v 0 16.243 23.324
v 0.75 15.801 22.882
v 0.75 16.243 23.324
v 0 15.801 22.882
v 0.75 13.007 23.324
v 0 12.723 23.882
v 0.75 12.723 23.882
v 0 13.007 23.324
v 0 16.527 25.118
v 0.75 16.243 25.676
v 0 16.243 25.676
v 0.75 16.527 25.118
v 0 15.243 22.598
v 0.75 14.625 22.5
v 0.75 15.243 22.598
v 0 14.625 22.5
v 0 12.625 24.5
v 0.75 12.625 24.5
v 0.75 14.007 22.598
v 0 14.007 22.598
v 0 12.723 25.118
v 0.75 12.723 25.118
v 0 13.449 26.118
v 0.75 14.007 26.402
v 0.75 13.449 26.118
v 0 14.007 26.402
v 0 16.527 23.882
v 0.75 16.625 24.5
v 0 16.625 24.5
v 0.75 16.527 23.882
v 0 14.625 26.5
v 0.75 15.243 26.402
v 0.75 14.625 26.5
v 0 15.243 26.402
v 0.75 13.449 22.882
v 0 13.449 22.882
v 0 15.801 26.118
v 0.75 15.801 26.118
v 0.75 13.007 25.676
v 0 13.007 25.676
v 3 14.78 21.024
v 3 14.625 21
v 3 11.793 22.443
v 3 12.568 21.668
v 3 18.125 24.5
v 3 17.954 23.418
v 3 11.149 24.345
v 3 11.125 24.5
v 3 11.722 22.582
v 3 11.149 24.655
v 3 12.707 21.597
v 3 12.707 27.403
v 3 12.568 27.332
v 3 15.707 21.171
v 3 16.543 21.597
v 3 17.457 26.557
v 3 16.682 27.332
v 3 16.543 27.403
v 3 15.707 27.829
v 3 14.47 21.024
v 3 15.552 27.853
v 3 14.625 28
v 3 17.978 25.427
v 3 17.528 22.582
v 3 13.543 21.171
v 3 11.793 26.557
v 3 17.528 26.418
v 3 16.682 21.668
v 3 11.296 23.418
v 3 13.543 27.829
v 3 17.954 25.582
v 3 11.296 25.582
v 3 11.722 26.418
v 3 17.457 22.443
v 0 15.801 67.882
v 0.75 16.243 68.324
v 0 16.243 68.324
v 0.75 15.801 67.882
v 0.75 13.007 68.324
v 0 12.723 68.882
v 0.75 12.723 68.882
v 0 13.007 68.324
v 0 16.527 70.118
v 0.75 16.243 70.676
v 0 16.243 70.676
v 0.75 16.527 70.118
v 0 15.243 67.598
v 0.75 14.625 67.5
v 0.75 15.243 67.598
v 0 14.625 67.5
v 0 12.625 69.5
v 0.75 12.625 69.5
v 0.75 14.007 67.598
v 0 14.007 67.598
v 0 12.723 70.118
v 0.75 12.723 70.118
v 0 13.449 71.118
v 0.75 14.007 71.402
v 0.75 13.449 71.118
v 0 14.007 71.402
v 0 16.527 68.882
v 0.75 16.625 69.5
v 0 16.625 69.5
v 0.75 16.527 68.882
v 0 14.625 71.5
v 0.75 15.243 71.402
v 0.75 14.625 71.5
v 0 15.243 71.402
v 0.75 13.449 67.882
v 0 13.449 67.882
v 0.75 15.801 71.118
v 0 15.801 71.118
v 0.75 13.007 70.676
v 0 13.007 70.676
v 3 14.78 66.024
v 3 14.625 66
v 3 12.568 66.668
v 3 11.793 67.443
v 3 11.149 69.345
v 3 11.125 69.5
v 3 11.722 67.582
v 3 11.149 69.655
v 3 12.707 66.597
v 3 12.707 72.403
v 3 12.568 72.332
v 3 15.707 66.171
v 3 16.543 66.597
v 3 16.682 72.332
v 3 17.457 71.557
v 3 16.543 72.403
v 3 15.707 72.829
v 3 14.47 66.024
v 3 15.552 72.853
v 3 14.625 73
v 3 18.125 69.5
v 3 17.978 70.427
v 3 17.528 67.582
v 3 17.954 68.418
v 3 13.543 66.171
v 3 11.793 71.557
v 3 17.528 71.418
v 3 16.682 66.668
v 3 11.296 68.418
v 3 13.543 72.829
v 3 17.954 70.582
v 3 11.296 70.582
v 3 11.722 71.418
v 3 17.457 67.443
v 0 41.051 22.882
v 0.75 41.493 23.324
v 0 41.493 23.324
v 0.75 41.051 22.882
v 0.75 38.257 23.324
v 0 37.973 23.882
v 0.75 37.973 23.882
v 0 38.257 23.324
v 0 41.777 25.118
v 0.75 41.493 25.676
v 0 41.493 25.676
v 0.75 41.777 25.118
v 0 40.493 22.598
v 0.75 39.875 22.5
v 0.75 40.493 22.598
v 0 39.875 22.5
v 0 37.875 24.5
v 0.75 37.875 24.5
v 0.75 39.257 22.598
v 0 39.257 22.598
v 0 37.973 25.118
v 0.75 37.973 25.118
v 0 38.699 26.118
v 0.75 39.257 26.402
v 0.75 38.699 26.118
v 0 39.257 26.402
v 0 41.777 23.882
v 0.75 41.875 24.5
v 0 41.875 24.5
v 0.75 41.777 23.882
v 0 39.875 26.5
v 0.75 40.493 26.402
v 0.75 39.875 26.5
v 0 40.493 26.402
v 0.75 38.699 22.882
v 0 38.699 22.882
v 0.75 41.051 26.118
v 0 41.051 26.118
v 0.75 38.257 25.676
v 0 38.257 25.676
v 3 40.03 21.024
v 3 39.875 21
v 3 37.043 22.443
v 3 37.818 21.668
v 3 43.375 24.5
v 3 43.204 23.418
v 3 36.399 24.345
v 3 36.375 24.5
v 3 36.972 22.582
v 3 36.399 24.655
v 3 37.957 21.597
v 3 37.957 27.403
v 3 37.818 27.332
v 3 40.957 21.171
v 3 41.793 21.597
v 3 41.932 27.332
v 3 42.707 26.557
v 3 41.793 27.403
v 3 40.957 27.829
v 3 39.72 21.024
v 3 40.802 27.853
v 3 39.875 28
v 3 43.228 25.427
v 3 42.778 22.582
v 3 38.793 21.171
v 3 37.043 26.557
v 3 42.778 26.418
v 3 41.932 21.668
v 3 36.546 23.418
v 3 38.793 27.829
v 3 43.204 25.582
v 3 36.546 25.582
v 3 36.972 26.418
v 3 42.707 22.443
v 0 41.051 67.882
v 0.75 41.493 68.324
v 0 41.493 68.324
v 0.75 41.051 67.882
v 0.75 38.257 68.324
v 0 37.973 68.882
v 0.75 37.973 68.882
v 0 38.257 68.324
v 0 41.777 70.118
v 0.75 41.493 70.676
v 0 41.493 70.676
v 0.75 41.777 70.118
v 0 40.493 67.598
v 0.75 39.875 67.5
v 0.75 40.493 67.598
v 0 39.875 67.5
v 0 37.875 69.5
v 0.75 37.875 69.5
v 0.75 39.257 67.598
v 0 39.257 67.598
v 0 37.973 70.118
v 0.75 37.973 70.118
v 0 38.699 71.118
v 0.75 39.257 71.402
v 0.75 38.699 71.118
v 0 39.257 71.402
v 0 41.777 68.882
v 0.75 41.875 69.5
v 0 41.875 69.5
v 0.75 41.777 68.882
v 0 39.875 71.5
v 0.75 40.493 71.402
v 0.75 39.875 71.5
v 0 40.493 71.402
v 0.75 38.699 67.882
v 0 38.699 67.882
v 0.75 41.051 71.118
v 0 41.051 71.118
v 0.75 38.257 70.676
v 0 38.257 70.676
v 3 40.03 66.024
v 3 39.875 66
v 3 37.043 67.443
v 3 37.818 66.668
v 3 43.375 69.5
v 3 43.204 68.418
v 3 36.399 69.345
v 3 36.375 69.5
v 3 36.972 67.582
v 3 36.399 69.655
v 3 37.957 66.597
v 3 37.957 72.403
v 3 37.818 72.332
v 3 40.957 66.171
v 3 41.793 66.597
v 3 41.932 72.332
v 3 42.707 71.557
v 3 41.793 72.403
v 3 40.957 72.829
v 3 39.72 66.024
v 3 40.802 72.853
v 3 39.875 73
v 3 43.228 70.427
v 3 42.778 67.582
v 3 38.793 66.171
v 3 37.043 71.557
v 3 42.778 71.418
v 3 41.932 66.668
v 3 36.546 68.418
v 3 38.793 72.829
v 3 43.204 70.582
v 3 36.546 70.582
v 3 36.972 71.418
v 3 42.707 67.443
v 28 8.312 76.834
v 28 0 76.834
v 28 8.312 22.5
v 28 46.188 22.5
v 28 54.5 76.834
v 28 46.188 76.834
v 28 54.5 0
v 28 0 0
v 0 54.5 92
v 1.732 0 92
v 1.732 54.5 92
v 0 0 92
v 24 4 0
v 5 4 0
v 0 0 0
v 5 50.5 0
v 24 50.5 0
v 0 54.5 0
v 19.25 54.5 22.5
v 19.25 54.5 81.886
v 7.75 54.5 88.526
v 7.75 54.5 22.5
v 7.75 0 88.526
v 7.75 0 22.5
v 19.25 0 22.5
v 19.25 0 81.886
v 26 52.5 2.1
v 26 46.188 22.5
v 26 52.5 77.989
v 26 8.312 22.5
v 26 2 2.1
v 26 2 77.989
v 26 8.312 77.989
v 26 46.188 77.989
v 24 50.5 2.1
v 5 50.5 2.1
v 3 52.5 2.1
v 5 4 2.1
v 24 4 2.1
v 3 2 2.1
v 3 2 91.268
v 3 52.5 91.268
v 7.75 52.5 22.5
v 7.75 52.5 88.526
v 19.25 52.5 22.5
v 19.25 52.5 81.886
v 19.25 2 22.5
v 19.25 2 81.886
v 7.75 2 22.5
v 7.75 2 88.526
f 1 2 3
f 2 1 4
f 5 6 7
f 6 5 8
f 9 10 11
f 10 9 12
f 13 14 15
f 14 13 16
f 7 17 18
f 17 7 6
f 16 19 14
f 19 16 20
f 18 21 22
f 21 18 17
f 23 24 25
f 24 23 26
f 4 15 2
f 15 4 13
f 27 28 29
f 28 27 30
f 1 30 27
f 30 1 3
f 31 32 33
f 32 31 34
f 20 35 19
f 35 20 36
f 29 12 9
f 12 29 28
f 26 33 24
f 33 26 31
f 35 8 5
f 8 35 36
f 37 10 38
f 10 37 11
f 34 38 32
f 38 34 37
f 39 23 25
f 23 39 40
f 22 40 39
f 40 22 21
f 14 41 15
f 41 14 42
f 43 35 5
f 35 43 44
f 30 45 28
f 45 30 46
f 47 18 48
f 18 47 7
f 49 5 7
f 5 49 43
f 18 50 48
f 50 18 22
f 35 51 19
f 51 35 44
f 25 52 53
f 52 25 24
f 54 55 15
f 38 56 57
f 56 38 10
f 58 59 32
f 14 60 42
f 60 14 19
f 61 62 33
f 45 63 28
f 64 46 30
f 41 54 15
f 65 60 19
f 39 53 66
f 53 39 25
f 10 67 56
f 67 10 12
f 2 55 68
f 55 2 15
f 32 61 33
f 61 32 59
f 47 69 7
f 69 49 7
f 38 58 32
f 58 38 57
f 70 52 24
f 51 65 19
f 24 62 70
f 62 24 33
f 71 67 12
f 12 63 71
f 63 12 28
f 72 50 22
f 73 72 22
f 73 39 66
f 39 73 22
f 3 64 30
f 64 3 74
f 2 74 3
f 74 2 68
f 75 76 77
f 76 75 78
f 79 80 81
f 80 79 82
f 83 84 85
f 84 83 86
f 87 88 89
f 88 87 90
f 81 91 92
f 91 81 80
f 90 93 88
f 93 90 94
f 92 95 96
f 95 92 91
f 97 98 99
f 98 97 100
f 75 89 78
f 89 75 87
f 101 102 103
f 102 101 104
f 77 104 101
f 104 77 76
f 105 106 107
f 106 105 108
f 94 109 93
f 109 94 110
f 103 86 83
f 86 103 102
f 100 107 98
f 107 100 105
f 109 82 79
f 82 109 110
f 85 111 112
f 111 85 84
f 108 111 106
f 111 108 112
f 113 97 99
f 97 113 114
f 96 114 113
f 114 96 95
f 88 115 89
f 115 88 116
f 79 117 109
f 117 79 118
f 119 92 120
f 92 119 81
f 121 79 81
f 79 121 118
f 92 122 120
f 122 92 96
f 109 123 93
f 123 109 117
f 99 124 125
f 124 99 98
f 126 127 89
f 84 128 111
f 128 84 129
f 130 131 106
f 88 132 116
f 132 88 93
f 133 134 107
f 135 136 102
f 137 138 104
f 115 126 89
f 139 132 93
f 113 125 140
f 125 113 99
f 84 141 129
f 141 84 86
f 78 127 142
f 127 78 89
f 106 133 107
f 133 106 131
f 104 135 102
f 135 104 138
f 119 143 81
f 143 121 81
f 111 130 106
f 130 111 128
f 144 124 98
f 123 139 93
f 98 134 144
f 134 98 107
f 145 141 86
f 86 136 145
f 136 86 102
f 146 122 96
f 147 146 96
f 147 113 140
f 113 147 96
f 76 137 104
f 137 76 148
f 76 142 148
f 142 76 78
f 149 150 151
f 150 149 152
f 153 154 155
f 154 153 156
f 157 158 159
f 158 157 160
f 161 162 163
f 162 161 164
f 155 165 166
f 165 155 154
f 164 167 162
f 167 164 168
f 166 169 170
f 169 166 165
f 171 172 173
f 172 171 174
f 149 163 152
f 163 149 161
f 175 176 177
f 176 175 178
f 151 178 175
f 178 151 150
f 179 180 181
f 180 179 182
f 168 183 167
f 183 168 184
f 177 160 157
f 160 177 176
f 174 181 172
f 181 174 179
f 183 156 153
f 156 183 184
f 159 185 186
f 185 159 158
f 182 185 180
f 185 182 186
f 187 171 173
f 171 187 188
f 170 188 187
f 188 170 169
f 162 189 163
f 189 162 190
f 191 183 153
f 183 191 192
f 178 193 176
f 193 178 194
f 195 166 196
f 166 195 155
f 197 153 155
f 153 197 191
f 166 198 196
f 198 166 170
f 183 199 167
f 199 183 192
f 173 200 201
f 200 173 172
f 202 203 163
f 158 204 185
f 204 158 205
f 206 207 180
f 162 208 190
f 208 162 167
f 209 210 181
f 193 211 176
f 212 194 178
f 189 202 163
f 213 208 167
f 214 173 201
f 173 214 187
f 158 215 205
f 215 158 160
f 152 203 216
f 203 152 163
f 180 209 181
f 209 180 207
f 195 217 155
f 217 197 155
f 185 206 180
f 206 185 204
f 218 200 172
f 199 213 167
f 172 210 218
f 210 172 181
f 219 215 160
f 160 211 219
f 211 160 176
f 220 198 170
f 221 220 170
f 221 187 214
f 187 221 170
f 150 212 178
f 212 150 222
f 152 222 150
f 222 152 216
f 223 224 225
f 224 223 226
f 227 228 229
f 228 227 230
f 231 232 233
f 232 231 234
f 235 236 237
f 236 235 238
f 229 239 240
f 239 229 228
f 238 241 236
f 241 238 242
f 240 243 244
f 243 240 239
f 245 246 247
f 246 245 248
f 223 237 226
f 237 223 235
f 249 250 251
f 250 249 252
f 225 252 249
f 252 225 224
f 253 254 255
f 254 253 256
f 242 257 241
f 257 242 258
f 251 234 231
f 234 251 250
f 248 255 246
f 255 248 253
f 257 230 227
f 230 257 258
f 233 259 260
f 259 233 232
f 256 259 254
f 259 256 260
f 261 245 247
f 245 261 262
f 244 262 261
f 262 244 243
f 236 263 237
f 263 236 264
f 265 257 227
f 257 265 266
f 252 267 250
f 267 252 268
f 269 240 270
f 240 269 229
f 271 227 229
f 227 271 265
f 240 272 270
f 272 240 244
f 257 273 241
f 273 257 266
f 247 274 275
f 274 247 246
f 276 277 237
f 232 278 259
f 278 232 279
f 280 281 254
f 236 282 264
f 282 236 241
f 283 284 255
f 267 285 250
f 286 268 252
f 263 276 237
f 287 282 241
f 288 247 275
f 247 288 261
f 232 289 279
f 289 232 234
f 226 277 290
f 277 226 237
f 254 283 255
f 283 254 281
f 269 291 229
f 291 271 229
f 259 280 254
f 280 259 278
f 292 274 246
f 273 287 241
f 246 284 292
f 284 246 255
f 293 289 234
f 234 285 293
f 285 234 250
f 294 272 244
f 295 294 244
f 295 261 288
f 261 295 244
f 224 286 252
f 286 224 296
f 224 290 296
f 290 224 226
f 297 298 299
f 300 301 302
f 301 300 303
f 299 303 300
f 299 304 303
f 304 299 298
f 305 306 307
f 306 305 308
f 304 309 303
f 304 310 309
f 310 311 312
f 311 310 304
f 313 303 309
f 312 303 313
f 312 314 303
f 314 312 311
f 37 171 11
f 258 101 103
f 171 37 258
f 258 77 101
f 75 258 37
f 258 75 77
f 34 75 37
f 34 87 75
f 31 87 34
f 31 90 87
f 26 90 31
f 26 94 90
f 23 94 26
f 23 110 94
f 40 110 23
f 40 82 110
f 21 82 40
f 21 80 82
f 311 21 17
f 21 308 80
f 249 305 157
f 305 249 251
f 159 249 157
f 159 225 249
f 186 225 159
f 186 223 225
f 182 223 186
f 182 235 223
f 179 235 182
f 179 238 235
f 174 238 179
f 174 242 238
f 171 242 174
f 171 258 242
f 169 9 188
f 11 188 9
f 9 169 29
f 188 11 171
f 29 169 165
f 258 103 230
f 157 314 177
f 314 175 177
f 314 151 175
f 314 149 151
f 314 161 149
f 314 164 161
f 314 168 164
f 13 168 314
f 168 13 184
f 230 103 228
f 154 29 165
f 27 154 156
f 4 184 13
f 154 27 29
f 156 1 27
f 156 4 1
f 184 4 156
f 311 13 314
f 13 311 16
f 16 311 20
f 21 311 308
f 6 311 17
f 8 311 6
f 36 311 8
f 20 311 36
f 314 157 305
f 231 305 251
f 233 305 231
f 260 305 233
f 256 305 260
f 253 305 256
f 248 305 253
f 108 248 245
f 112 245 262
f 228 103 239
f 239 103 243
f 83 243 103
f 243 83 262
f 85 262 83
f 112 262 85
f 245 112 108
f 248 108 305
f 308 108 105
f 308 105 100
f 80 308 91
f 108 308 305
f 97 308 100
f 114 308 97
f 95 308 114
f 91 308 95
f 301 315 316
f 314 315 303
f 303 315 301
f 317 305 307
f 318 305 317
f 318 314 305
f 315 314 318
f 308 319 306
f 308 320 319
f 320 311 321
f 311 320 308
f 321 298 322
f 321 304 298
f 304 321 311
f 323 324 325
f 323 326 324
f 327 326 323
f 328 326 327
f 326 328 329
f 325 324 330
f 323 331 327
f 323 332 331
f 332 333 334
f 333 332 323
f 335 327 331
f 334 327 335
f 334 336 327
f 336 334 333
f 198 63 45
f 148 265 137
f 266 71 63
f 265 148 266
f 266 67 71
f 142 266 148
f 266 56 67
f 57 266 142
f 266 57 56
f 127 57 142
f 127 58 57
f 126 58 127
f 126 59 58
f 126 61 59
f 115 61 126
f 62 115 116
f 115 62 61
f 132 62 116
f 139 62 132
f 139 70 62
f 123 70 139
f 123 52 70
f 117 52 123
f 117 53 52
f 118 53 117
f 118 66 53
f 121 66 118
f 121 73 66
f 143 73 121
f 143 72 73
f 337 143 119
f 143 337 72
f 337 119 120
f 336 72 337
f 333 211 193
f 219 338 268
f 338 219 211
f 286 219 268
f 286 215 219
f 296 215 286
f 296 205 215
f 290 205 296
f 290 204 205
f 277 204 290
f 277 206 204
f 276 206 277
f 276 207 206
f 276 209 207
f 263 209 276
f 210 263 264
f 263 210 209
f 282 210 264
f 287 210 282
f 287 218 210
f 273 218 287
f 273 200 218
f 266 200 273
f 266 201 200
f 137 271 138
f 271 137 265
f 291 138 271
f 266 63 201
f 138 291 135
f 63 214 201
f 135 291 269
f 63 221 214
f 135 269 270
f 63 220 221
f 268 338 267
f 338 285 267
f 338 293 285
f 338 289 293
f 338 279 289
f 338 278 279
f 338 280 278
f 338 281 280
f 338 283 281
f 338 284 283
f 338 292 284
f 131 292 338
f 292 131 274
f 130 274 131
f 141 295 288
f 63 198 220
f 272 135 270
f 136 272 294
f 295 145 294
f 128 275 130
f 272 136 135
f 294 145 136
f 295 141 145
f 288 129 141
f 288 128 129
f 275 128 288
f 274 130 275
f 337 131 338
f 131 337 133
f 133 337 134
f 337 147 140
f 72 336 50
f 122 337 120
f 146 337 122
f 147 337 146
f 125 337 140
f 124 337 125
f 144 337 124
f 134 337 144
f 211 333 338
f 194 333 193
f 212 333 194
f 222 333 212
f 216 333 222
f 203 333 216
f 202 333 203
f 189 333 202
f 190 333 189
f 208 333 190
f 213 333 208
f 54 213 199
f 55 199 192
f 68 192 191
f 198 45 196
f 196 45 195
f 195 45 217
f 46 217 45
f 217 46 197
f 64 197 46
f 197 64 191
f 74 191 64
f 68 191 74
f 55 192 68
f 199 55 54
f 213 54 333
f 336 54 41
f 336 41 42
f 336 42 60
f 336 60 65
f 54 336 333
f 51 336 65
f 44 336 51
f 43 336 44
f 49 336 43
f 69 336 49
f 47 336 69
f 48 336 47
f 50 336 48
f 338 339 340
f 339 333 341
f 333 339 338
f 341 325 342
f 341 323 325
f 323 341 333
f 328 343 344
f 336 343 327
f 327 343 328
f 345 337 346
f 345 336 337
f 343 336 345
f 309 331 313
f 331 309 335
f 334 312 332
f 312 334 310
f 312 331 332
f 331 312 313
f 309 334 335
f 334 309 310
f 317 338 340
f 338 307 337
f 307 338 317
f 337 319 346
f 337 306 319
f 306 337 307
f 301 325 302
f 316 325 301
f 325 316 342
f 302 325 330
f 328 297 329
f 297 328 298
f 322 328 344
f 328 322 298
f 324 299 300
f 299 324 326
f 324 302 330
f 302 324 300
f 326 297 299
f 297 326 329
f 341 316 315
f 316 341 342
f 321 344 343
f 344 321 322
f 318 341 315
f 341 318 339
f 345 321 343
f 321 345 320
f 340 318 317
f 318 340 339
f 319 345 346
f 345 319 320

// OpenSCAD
// Width of back wall (so that screw will sit flush)
backWallWidth = 3;

// Width of the walls
wallWidth = 2;

// Length of the brick
length = 23;

// Width of the brick
width = 50.5;

// Height of the holder
height = 90;

// Bottom lip protrusion
bottomLip = 2;

// A little bit larger than the threads
screwDiameter = 4;

// Chamfer angle of the top
chamferAngle = 30;

$fn=20;

module mainBox() {
  difference() {
    // Body
    cube([length + backWallWidth + wallWidth, width + (wallWidth * 2), height + wallWidth]);

    // Main Cutout
    translate([backWallWidth, wallWidth, wallWidth + 0.1]) 
      cube([length, width, height]);
    
    // Bottom Lip Cutout
    translate([backWallWidth + bottomLip, wallWidth + bottomLip, -0.1])
      cube([length - (bottomLip * 2), width - (bottomLip * 2), height]);
    
    // Top Box Chamfer
    translate([0, -0.1, height + backWallWidth]) 
      rotate([0, chamferAngle, 0])
      cube([height * 2, width + (wallWidth * 2) + 0.2, length]);
    
    // Cutout front air vent
    cutoutWidth = (width / 4) * 3;
    translate([wallWidth + length - 0.1, wallWidth + (width - cutoutWidth) / 2, height / 4])
      cube([length, cutoutWidth, height]);
    
    // Cutout side air vents
    cutoutLength = (length / 4) * 2;
    translate([wallWidth + (length - cutoutLength) / 2, -0.1, height / 4])
      cube([cutoutLength, width * 2, height]);

    
    // Screws
    screwHole([0, wallWidth + (width / 4) * 1, wallWidth + (height / 4) * 1]);
    screwHole([0, wallWidth + (width / 4) * 1, wallWidth + (height / 4) * 3]);
    screwHole([0, wallWidth + (width / 4) * 3, wallWidth + (height / 4) * 1]);
    screwHole([0, wallWidth + (width / 4) * 3, wallWidth + (height / 4) * 3]);
    
  }
}


module screwHole(position) {
  // Main screw hole
  translate([position[0] - 0.1, position[1], position[2]])
    rotate([0, 90, 0])
    cylinder(5, d=screwDiameter);  
  
  // Screw hole chamfer
  translate([position[0] + (backWallWidth / 4), position[1], position[2]])
    rotate([0, 90, 0])
    cylinder(backWallWidth, d1=screwDiameter, d2=screwDiameter * 2);    

}

mainBox();
